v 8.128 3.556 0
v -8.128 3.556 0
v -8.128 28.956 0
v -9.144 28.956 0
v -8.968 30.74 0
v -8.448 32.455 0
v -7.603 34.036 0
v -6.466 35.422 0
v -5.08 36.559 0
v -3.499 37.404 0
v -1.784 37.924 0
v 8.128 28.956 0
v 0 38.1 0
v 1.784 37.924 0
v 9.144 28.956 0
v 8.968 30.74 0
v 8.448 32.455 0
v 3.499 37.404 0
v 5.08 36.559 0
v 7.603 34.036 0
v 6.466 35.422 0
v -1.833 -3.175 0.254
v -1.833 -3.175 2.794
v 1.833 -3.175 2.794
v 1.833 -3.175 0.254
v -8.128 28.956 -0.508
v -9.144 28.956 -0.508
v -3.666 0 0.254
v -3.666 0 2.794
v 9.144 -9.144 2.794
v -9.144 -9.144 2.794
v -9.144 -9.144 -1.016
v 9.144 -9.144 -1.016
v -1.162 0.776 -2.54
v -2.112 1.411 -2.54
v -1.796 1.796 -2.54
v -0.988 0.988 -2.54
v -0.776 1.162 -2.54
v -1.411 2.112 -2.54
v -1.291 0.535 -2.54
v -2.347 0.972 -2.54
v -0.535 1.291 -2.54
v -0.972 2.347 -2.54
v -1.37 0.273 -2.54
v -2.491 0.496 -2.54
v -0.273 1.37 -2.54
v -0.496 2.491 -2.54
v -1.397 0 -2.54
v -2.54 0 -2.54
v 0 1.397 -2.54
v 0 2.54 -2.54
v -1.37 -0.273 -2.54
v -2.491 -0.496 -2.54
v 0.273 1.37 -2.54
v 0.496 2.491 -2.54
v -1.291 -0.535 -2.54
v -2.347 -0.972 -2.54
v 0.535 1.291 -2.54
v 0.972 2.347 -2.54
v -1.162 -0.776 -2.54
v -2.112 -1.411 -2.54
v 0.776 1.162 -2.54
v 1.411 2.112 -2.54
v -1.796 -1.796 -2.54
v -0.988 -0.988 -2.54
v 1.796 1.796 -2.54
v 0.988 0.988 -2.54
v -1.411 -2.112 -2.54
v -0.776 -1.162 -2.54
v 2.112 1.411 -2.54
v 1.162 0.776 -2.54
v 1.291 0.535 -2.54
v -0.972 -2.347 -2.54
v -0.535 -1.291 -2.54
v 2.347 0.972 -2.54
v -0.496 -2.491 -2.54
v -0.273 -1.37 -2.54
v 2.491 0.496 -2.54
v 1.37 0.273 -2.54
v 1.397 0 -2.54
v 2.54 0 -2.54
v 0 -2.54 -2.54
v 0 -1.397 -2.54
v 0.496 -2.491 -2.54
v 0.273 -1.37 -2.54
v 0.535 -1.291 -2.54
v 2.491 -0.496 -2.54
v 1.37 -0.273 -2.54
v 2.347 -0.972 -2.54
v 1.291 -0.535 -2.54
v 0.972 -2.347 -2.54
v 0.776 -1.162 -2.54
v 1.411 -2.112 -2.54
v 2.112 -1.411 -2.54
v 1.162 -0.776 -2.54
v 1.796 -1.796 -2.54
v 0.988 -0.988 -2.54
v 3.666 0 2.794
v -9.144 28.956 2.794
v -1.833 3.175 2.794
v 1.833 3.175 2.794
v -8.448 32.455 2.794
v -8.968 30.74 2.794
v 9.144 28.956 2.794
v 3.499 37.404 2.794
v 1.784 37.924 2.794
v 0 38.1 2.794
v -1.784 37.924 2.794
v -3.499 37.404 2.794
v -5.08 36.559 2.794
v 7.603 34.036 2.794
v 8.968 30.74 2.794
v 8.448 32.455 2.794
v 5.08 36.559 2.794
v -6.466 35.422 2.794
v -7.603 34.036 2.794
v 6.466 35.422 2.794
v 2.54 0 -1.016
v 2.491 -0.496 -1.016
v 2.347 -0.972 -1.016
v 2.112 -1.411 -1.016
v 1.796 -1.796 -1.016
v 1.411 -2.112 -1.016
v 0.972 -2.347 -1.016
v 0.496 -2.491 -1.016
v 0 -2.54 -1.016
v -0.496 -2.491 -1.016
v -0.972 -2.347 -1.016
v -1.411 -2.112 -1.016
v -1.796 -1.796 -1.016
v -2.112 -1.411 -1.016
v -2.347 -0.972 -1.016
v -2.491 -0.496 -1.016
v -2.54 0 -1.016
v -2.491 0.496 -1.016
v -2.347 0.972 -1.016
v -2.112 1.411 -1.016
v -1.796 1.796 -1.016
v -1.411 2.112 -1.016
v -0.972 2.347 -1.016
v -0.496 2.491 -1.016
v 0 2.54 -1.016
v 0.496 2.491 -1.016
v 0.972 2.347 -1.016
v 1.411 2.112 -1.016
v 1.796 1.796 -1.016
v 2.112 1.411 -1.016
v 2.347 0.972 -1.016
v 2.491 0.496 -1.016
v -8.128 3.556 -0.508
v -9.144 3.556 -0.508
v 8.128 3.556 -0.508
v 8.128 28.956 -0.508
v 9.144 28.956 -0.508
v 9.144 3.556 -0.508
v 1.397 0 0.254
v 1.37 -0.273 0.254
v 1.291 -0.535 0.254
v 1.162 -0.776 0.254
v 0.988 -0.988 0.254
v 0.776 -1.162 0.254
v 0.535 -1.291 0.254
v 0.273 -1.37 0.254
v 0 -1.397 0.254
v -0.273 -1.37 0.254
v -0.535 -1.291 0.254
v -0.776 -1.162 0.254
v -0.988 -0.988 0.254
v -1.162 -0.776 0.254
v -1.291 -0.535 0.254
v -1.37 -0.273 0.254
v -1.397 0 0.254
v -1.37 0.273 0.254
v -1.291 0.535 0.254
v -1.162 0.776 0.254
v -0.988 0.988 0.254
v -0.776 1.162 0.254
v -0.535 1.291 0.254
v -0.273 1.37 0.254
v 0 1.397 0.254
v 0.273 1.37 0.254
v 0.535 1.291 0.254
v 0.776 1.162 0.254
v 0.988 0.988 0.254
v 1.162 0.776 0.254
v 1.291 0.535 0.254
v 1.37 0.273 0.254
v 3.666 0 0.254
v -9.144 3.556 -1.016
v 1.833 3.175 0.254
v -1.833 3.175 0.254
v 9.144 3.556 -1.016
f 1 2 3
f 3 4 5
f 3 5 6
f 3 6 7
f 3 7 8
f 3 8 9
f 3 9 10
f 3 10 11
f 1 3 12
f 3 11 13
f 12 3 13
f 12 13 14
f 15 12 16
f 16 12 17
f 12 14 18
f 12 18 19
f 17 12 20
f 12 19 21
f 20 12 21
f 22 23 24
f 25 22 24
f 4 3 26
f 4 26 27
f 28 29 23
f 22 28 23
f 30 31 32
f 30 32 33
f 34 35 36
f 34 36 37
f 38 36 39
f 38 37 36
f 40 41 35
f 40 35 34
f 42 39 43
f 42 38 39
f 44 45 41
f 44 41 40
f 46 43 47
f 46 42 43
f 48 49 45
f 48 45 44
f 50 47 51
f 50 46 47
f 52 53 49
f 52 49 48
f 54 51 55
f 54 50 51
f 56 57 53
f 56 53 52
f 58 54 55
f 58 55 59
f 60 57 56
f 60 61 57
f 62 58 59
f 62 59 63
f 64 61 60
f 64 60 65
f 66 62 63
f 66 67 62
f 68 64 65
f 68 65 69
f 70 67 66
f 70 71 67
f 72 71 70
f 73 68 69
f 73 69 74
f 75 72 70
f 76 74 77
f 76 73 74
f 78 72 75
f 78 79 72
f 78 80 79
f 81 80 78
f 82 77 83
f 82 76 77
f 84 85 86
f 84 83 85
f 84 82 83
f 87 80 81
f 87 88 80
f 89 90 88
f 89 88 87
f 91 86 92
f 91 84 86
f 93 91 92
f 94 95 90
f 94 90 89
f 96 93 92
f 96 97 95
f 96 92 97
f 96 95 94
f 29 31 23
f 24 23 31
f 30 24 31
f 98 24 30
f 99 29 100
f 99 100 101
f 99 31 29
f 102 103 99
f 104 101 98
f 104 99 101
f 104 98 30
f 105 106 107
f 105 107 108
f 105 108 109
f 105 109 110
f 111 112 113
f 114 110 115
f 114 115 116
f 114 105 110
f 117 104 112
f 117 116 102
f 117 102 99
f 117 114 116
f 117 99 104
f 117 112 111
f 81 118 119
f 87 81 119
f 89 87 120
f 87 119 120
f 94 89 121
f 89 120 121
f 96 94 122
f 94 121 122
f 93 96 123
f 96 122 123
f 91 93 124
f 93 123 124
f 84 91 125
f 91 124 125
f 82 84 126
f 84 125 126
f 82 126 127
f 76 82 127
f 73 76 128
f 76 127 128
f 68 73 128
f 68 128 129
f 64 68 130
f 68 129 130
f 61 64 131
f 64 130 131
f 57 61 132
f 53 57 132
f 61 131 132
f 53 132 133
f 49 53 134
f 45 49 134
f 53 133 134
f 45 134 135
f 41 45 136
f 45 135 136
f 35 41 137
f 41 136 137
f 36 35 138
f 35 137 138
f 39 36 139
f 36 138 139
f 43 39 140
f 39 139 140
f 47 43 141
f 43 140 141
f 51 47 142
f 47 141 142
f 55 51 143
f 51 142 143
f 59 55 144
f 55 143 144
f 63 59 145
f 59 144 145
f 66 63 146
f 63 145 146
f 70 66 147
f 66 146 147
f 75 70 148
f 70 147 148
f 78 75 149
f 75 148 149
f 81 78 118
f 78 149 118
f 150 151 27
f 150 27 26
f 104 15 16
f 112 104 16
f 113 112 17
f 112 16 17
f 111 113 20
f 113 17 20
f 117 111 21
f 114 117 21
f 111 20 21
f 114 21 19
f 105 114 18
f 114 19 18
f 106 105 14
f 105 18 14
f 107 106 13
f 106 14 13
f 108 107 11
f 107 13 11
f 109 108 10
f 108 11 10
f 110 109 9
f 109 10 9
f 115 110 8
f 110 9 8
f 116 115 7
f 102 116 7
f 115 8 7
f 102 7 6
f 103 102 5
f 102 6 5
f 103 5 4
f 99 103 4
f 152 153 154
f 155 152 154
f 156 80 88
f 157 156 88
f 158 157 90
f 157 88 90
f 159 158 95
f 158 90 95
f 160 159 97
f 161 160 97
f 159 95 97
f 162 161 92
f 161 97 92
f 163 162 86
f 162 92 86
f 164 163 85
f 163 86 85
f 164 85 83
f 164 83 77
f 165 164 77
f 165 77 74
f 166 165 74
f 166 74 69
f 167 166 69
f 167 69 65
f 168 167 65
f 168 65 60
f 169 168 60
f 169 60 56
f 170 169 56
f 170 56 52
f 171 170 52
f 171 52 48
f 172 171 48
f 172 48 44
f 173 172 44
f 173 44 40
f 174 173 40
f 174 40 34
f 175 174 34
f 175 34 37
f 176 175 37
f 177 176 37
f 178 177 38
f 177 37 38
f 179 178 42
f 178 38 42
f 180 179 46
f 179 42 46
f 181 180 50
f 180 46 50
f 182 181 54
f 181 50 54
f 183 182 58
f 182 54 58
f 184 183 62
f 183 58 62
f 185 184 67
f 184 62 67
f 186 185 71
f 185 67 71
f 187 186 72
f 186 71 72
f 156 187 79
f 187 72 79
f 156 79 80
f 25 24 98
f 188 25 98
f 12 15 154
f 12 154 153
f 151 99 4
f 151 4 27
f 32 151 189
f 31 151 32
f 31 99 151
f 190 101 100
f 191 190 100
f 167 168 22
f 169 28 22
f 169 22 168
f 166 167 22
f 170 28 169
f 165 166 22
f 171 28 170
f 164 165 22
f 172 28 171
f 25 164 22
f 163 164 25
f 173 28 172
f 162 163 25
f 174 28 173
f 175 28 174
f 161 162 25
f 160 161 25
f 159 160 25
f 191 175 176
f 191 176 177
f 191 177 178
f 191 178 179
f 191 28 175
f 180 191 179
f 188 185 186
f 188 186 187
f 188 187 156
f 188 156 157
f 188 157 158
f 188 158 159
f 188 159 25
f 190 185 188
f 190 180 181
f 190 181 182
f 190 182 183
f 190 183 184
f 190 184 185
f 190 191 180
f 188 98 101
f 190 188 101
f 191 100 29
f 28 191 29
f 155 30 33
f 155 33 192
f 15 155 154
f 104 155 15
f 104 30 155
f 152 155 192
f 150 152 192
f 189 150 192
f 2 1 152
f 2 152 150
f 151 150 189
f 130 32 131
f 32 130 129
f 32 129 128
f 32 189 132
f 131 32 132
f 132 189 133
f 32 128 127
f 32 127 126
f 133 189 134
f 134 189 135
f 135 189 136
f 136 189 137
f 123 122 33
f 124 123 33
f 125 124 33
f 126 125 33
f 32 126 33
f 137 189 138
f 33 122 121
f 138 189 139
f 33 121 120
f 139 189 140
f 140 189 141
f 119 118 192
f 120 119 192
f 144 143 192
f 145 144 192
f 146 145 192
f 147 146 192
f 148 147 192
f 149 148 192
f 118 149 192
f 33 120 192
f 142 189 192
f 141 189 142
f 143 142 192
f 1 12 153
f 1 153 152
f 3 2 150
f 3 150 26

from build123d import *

# Parameters (mm, degrees)
F0_W     = 1.016
F0_H     = 3.556
F0_H_2   = 5.588
F1_DEPTH = 2.794
F2_DEPTH = 0.508
F3_DEPTH = 1.016
F4_R     = 2.54
F5_DEPTH = 1.524
F6_R     = 1.397
F7_DEPTH = 5.334
F9_DEPTH = 2.54


with BuildPart() as f1:
    # F0 (on Top) → F1 (new body)
    with BuildSketch(Plane.XY):
        with BuildLine():
            Line((8.128, 28.956), (9.144, 28.956))
            ThreePointArc((9.144, 28.956), (0, 38.1), (-9.144, 28.956))
            Line((-9.144, 28.956), (-8.128, 28.956))
            Line((-8.128, 28.956), (-2.54, 28.956))
            ThreePointArc((-2.54, 28.956), (0, 31.496), (2.54, 28.956))
            Line((2.54, 28.956), (8.128, 28.956))
        make_face()
        with BuildLine():
            ThreePointArc((-8.128, 24.7669246844), (0, 19.812), (8.128, 24.7669246844))
            Line((8.128, 24.7669246844), (8.128, 28.956))
            Line((8.128, 28.956), (2.54, 28.956))
            ThreePointArc((2.54, 28.956), (0, 26.416), (-2.54, 28.956))
            Line((-2.54, 28.956), (-8.128, 28.956))
            Line((-8.128, 28.956), (-8.128, 24.7669246844))
        make_face()
        with BuildLine():
            Line((8.128, 24.7669246844), (8.128, 9.144))
            Line((8.128, 9.144), (9.144, 9.144))
            Line((9.144, 9.144), (9.144, 28.956))
            ThreePointArc((9.144, 28.956), (8.8863706877, 26.8007385309), (8.128, 24.7669246844))
        make_face()
        with BuildLine():
            Line((8.128, 28.956), (8.128, 24.7669246844))
            ThreePointArc((8.128, 24.7669246844), (8.8863706877, 26.8007385309), (9.144, 28.956))
            Line((9.144, 28.956), (8.128, 28.956))
        make_face()
        with BuildLine():
            ThreePointArc((-2.54, 28.956), (0, 26.416), (2.54, 28.956))
            Line((2.54, 28.956), (-2.54, 28.956))
        make_face()
        with BuildLine():
            Line((-2.54, 28.956), (2.54, 28.956))
            ThreePointArc((2.54, 28.956), (0, 31.496), (-2.54, 28.956))
        make_face()
        with BuildLine():
            ThreePointArc((-9.144, 28.956), (-8.8863706877, 26.8007385309), (-8.128, 24.7669246844))
            Line((-8.128, 24.7669246844), (-8.128, 28.956))
            Line((-8.128, 28.956), (-9.144, 28.956))
        make_face()
        with BuildLine():
            Line((-9.144, 9.144), (-8.128, 9.144))
            Line((-8.128, 9.144), (-8.128, 24.7669246844))
            ThreePointArc((-8.128, 24.7669246844), (-8.8863706877, 26.8007385309), (-9.144, 28.956))
            Line((-9.144, 28.956), (-9.144, 9.144))
        make_face()
        with BuildLine():
            Line((-8.128, 9.144), (8.128, 9.144))
            Line((8.128, 9.144), (8.128, 24.7669246844))
            ThreePointArc((8.128, 24.7669246844), (0, 19.812), (-8.128, 24.7669246844))
            Line((-8.128, 24.7669246844), (-8.128, 9.144))
        make_face()
        Polygon((-8.128, 3.556), (0, 3.556), (8.128, 3.556), (8.128, 9.144), (-8.128, 9.144), align=None)
        with BuildLine():
            ThreePointArc((-2.54, 0), (-1.7960512242, 1.7960512242), (0, 2.54))
            Line((0, 2.54), (0, 3.556))
            Line((0, 3.556), (-8.128, 3.556))
            Line((-8.128, 3.556), (-8.128, 0))
            Line((-8.128, 0), (-2.54, 0))
        make_face()
        with BuildLine():
            Line((0, -9.144), (0, -2.54))
            ThreePointArc((0, -2.54), (-1.7960512242, -1.7960512242), (-2.54, 0))
            Line((-2.54, 0), (-8.128, 0))
            Line((-8.128, 0), (-9.144, 0))
            Line((-9.144, 0), (-9.144, -9.144))
            Line((-9.144, -9.144), (0, -9.144))
        make_face()
        with Locations((-8.636, 1.778)):
            Rectangle(F0_W, F0_H)
        with BuildLine():
            ThreePointArc((0, 2.54), (1.7960512242, 1.7960512242), (2.54, 0))
            Line((2.54, 0), (8.128, 0))
            Line((8.128, 0), (8.128, 3.556))
            Line((8.128, 3.556), (0, 3.556))
            Line((0, 3.556), (0, 2.54))
        make_face()
        with Locations((8.636, 1.778)):
            Rectangle(F0_W, F0_H)
        with BuildLine():
            Line((8.128, 0), (2.54, 0))
            ThreePointArc((2.54, 0), (1.7960512242, -1.7960512242), (0, -2.54))
            Line((0, -2.54), (0, -9.144))
            Line((0, -9.144), (9.144, -9.144))
            Line((9.144, -9.144), (9.144, 0))
            Line((9.144, 0), (8.128, 0))
        make_face()
        with BuildLine():
            ThreePointArc((0, -2.54), (1.7960512242, -1.7960512242), (2.54, 0))
            Line((2.54, 0), (0, 0))
            Line((0, 0), (-2.54, 0))
            ThreePointArc((-2.54, 0), (-1.7960512242, -1.7960512242), (0, -2.54))
        make_face()
        with BuildLine():
            Line((0, 0), (2.54, 0))
            ThreePointArc((2.54, 0), (1.7960512242, 1.7960512242), (0, 2.54))
            ThreePointArc((0, 2.54), (-1.7960512242, 1.7960512242), (-2.54, 0))
            Line((-2.54, 0), (0, 0))
        make_face()
        with Locations((-8.636, 6.35)):
            Rectangle(F0_W, F0_H_2)
        with Locations((8.636, 6.35)):
            Rectangle(F0_W, F0_H_2)
    extrude(amount=F1_DEPTH)

    # F0 (on Top) → F2 (join)
    with BuildSketch(Plane.XY):
        with BuildLine():
            ThreePointArc((-9.144, 28.956), (-8.8863706877, 26.8007385309), (-8.128, 24.7669246844))
            Line((-8.128, 24.7669246844), (-8.128, 28.956))
            Line((-8.128, 28.956), (-9.144, 28.956))
        make_face()
        with BuildLine():
            Line((-9.144, 9.144), (-8.128, 9.144))
            Line((-8.128, 9.144), (-8.128, 24.7669246844))
            ThreePointArc((-8.128, 24.7669246844), (-8.8863706877, 26.8007385309), (-9.144, 28.956))
            Line((-9.144, 28.956), (-9.144, 9.144))
        make_face()
        with BuildLine():
            Line((8.128, 24.7669246844), (8.128, 9.144))
            Line((8.128, 9.144), (9.144, 9.144))
            Line((9.144, 9.144), (9.144, 28.956))
            ThreePointArc((9.144, 28.956), (8.8863706877, 26.8007385309), (8.128, 24.7669246844))
        make_face()
        with BuildLine():
            Line((8.128, 28.956), (8.128, 24.7669246844))
            ThreePointArc((8.128, 24.7669246844), (8.8863706877, 26.8007385309), (9.144, 28.956))
            Line((9.144, 28.956), (8.128, 28.956))
        make_face()
        with Locations((-8.636, 6.35)):
            Rectangle(F0_W, F0_H_2)
        with Locations((8.636, 6.35)):
            Rectangle(F0_W, F0_H_2)
    extrude(amount=-F2_DEPTH)

    # F0 (on Top) → F3 (join)
    with BuildSketch(Plane.XY):
        with BuildLine():
            Line((0, -9.144), (0, -2.54))
            ThreePointArc((0, -2.54), (-1.7960512242, -1.7960512242), (-2.54, 0))
            Line((-2.54, 0), (-8.128, 0))
            Line((-8.128, 0), (-9.144, 0))
            Line((-9.144, 0), (-9.144, -9.144))
            Line((-9.144, -9.144), (0, -9.144))
        make_face()
        with BuildLine():
            ThreePointArc((-2.54, 0), (-1.7960512242, 1.7960512242), (0, 2.54))
            Line((0, 2.54), (0, 3.556))
            Line((0, 3.556), (-8.128, 3.556))
            Line((-8.128, 3.556), (-8.128, 0))
            Line((-8.128, 0), (-2.54, 0))
        make_face()
        with BuildLine():
            ThreePointArc((0, -2.54), (1.7960512242, -1.7960512242), (2.54, 0))
            Line((2.54, 0), (0, 0))
            Line((0, 0), (-2.54, 0))
            ThreePointArc((-2.54, 0), (-1.7960512242, -1.7960512242), (0, -2.54))
        make_face()
        with BuildLine():
            Line((0, 0), (2.54, 0))
            ThreePointArc((2.54, 0), (1.7960512242, 1.7960512242), (0, 2.54))
            ThreePointArc((0, 2.54), (-1.7960512242, 1.7960512242), (-2.54, 0))
            Line((-2.54, 0), (0, 0))
        make_face()
        with BuildLine():
            ThreePointArc((0, 2.54), (1.7960512242, 1.7960512242), (2.54, 0))
            Line((2.54, 0), (8.128, 0))
            Line((8.128, 0), (8.128, 3.556))
            Line((8.128, 3.556), (0, 3.556))
            Line((0, 3.556), (0, 2.54))
        make_face()
        with BuildLine():
            Line((8.128, 0), (2.54, 0))
            ThreePointArc((2.54, 0), (1.7960512242, -1.7960512242), (0, -2.54))
            Line((0, -2.54), (0, -9.144))
            Line((0, -9.144), (9.144, -9.144))
            Line((9.144, -9.144), (9.144, 0))
            Line((9.144, 0), (8.128, 0))
        make_face()
        with Locations((-8.636, 1.778)):
            Rectangle(F0_W, F0_H)
        with Locations((8.636, 1.778)):
            Rectangle(F0_W, F0_H)
    extrude(amount=-F3_DEPTH)

    # F4 (on face) → F5 (join)
    with BuildSketch(Plane(origin=(0, 0, -1.016), x_dir=(1, 0, 0), z_dir=(0, 0, -1))):
        Circle(F4_R)
    extrude(amount=F5_DEPTH)

    # F6 (on face) → F7 (cut, through all)
    with BuildSketch(Plane(origin=(0, 0, -2.54), x_dir=(1, 0, 0), z_dir=(0, 0, -1))):
        Circle(F6_R)
    extrude(amount=-F7_DEPTH, mode=Mode.SUBTRACT)

    # F8 (on face) → F9 (cut)
    with BuildSketch(Plane.XY.offset(2.794)):
        Polygon((-1.8330871047, -3.175), (0, -3.175), (1.8330871047, -3.175), (3.6661742094, 0), (1.8330871047, 3.175), (-1.8330871047, 3.175), (-3.6661742094, 0), align=None)
        with BuildLine():
            ThreePointArc((1.397, 0), (0.9878281733, -0.9878281733), (0, -1.397))
            ThreePointArc((0, -1.397), (-0.9878281733, 0.9878281733), (1.397, 0))
        make_face(mode=Mode.SUBTRACT)
    extrude(amount=-F9_DEPTH, mode=Mode.SUBTRACT)


solid = f1.part
